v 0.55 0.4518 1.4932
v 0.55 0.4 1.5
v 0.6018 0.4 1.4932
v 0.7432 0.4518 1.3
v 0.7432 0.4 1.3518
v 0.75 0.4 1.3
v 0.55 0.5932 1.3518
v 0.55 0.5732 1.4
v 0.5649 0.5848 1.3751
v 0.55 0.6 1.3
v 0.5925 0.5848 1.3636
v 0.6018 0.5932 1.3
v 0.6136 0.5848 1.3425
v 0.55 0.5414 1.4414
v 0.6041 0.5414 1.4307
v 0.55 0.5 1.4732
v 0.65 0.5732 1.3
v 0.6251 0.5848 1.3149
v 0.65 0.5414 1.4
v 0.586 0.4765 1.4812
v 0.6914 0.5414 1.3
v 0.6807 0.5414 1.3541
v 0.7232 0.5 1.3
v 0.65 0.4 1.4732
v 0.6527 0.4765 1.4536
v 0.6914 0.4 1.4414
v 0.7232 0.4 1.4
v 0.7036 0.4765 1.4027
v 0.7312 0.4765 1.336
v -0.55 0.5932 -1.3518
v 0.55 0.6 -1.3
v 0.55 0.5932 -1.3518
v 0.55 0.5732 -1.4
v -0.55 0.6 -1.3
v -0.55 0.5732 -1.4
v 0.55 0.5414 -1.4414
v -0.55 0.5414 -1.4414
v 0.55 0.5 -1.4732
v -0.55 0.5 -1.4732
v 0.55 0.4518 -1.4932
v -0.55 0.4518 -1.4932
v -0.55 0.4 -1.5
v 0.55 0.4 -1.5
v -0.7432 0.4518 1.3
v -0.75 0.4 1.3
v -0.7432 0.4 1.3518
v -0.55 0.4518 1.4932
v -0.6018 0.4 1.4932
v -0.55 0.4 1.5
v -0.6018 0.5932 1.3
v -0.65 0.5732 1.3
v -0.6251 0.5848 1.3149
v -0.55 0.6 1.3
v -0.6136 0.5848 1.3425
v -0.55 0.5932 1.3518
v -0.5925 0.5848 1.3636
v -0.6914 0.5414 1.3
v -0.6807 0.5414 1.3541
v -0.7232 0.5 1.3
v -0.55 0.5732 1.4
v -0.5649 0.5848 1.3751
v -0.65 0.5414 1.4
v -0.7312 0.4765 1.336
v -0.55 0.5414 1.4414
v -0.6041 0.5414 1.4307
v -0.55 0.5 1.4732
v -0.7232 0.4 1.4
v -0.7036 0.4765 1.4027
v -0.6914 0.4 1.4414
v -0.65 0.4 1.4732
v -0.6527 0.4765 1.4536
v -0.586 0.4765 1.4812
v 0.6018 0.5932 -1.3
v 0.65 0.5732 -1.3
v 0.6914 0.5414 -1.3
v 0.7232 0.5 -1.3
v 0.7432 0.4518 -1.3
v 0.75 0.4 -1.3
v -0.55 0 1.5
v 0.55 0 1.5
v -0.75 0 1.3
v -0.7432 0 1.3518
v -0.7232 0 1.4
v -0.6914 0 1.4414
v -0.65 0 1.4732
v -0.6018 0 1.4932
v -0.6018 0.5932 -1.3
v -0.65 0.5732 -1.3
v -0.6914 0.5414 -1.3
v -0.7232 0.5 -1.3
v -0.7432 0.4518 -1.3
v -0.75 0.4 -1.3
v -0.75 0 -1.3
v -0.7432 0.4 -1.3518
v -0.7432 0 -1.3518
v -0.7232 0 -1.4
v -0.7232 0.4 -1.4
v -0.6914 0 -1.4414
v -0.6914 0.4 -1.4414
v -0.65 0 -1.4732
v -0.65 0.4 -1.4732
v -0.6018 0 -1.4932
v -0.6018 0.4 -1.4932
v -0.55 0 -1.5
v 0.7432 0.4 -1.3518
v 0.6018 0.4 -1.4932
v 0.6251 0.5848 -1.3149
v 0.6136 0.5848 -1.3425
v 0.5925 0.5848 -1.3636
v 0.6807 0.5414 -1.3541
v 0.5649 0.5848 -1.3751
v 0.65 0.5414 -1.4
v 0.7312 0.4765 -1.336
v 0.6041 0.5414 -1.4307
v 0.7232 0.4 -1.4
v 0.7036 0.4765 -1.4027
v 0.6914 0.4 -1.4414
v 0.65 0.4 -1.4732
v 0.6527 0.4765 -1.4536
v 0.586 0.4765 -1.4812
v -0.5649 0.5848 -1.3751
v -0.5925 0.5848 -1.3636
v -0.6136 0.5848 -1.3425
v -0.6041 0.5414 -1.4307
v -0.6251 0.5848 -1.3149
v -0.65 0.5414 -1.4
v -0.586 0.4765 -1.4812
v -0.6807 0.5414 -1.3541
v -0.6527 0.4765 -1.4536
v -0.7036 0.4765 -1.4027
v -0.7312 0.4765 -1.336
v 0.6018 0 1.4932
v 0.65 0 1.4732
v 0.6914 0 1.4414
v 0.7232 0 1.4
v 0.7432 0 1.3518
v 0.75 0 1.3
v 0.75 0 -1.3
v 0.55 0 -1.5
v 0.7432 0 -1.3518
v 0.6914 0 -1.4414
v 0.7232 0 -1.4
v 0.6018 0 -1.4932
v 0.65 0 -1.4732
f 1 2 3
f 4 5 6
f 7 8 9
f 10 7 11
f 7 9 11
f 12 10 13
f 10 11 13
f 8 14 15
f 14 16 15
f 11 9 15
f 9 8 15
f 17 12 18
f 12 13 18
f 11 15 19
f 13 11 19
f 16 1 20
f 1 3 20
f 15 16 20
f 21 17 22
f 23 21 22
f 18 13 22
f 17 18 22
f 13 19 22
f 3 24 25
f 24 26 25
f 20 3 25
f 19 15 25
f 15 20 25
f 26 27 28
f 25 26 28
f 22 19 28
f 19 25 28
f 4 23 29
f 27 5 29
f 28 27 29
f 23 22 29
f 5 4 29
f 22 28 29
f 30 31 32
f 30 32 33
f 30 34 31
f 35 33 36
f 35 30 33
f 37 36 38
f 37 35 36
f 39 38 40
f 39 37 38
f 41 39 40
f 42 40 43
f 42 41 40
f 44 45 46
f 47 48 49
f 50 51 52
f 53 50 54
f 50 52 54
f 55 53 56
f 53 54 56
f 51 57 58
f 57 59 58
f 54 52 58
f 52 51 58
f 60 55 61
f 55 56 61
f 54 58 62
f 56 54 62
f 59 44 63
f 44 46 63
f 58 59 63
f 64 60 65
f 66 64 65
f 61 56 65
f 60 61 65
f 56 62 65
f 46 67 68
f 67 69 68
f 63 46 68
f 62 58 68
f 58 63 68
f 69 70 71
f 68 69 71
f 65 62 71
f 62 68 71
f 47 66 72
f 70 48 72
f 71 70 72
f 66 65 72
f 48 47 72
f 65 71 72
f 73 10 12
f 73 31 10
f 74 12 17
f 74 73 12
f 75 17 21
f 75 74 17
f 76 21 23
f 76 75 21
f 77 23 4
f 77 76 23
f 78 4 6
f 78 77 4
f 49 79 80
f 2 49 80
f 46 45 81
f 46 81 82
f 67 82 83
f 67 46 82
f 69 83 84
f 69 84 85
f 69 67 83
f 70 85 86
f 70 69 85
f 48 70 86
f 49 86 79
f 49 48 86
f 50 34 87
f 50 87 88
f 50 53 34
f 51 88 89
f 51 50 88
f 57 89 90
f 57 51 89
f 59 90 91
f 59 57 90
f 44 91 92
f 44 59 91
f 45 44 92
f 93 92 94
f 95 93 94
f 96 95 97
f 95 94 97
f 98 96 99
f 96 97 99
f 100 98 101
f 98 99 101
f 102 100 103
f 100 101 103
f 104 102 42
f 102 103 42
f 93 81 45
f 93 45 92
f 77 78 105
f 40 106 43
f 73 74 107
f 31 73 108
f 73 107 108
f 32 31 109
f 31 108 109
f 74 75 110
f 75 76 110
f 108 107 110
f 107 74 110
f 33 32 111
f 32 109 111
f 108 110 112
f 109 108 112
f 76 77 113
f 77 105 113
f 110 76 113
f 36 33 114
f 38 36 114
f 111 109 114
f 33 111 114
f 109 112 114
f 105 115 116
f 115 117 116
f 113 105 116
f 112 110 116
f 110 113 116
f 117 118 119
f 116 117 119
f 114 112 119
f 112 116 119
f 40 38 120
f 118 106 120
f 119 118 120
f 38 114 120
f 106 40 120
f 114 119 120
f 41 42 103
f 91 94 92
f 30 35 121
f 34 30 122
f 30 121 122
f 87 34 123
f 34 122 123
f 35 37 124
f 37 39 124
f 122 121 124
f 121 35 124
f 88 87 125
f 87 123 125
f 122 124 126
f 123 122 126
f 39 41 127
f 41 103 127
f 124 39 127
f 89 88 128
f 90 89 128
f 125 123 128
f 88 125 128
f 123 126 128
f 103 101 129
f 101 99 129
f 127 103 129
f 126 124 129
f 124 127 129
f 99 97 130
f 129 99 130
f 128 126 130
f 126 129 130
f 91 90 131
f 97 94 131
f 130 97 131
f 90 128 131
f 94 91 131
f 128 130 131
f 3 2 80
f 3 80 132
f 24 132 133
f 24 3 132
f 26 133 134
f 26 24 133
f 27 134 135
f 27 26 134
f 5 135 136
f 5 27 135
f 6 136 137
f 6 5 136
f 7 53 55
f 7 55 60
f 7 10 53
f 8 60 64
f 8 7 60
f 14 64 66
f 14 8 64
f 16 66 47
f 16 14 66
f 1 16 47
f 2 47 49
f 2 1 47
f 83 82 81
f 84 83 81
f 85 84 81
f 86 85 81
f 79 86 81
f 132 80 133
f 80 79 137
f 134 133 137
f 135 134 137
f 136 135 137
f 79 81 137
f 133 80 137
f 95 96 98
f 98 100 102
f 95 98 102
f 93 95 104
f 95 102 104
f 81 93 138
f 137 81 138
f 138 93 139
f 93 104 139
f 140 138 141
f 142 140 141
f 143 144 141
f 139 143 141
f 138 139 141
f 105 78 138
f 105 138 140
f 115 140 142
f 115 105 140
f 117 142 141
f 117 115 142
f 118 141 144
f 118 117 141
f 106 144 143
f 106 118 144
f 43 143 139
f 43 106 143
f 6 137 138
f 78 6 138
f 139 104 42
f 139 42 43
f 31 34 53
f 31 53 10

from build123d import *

# Parameters (mm, degrees)
BASES_W    = 1.5
BASES_H    = 3
BASE_DEPTH = 0.6
SIDEF_R    = 0.2
TOPF_R     = 0.2


with BuildPart() as part:
    # BaseS → Base (new body)
    with BuildSketch(Plane(origin=(0, 0, 0), x_dir=(1, 0, 0), z_dir=(0, 1, 0))):
        Rectangle(BASES_W, BASES_H)
    extrude(amount=BASE_DEPTH)

    # SideF
    sidef_edges = [part.edges().sort_by_distance(p)[0] for p in [
        (0.75, 0.3, 1.5),
        (-0.75, 0.3, 1.5),
        (-0.75, 0.3, -1.5),
        (0.75, 0.3, -1.5),
    ]]
    fillet(sidef_edges, radius=SIDEF_R)

    # TopF
    topf_edges = [part.edges().sort_by_distance(p)[0] for p in [
        (0.75, 0.6, 0),
        (0, 0.6, 1.5),
        (0, 0.6, -1.5),
        (-0.75, 0.6, 0),
        (-0.691421356, 0.6, -1.441421356),
        (-0.691421356, 0.6, 1.441421356),
        (0.691421356, 0.6, -1.441421356),
        (0.691421356, 0.6, 1.441421356),
    ]]
    fillet(topf_edges, radius=TOPF_R)


solid = part.part
